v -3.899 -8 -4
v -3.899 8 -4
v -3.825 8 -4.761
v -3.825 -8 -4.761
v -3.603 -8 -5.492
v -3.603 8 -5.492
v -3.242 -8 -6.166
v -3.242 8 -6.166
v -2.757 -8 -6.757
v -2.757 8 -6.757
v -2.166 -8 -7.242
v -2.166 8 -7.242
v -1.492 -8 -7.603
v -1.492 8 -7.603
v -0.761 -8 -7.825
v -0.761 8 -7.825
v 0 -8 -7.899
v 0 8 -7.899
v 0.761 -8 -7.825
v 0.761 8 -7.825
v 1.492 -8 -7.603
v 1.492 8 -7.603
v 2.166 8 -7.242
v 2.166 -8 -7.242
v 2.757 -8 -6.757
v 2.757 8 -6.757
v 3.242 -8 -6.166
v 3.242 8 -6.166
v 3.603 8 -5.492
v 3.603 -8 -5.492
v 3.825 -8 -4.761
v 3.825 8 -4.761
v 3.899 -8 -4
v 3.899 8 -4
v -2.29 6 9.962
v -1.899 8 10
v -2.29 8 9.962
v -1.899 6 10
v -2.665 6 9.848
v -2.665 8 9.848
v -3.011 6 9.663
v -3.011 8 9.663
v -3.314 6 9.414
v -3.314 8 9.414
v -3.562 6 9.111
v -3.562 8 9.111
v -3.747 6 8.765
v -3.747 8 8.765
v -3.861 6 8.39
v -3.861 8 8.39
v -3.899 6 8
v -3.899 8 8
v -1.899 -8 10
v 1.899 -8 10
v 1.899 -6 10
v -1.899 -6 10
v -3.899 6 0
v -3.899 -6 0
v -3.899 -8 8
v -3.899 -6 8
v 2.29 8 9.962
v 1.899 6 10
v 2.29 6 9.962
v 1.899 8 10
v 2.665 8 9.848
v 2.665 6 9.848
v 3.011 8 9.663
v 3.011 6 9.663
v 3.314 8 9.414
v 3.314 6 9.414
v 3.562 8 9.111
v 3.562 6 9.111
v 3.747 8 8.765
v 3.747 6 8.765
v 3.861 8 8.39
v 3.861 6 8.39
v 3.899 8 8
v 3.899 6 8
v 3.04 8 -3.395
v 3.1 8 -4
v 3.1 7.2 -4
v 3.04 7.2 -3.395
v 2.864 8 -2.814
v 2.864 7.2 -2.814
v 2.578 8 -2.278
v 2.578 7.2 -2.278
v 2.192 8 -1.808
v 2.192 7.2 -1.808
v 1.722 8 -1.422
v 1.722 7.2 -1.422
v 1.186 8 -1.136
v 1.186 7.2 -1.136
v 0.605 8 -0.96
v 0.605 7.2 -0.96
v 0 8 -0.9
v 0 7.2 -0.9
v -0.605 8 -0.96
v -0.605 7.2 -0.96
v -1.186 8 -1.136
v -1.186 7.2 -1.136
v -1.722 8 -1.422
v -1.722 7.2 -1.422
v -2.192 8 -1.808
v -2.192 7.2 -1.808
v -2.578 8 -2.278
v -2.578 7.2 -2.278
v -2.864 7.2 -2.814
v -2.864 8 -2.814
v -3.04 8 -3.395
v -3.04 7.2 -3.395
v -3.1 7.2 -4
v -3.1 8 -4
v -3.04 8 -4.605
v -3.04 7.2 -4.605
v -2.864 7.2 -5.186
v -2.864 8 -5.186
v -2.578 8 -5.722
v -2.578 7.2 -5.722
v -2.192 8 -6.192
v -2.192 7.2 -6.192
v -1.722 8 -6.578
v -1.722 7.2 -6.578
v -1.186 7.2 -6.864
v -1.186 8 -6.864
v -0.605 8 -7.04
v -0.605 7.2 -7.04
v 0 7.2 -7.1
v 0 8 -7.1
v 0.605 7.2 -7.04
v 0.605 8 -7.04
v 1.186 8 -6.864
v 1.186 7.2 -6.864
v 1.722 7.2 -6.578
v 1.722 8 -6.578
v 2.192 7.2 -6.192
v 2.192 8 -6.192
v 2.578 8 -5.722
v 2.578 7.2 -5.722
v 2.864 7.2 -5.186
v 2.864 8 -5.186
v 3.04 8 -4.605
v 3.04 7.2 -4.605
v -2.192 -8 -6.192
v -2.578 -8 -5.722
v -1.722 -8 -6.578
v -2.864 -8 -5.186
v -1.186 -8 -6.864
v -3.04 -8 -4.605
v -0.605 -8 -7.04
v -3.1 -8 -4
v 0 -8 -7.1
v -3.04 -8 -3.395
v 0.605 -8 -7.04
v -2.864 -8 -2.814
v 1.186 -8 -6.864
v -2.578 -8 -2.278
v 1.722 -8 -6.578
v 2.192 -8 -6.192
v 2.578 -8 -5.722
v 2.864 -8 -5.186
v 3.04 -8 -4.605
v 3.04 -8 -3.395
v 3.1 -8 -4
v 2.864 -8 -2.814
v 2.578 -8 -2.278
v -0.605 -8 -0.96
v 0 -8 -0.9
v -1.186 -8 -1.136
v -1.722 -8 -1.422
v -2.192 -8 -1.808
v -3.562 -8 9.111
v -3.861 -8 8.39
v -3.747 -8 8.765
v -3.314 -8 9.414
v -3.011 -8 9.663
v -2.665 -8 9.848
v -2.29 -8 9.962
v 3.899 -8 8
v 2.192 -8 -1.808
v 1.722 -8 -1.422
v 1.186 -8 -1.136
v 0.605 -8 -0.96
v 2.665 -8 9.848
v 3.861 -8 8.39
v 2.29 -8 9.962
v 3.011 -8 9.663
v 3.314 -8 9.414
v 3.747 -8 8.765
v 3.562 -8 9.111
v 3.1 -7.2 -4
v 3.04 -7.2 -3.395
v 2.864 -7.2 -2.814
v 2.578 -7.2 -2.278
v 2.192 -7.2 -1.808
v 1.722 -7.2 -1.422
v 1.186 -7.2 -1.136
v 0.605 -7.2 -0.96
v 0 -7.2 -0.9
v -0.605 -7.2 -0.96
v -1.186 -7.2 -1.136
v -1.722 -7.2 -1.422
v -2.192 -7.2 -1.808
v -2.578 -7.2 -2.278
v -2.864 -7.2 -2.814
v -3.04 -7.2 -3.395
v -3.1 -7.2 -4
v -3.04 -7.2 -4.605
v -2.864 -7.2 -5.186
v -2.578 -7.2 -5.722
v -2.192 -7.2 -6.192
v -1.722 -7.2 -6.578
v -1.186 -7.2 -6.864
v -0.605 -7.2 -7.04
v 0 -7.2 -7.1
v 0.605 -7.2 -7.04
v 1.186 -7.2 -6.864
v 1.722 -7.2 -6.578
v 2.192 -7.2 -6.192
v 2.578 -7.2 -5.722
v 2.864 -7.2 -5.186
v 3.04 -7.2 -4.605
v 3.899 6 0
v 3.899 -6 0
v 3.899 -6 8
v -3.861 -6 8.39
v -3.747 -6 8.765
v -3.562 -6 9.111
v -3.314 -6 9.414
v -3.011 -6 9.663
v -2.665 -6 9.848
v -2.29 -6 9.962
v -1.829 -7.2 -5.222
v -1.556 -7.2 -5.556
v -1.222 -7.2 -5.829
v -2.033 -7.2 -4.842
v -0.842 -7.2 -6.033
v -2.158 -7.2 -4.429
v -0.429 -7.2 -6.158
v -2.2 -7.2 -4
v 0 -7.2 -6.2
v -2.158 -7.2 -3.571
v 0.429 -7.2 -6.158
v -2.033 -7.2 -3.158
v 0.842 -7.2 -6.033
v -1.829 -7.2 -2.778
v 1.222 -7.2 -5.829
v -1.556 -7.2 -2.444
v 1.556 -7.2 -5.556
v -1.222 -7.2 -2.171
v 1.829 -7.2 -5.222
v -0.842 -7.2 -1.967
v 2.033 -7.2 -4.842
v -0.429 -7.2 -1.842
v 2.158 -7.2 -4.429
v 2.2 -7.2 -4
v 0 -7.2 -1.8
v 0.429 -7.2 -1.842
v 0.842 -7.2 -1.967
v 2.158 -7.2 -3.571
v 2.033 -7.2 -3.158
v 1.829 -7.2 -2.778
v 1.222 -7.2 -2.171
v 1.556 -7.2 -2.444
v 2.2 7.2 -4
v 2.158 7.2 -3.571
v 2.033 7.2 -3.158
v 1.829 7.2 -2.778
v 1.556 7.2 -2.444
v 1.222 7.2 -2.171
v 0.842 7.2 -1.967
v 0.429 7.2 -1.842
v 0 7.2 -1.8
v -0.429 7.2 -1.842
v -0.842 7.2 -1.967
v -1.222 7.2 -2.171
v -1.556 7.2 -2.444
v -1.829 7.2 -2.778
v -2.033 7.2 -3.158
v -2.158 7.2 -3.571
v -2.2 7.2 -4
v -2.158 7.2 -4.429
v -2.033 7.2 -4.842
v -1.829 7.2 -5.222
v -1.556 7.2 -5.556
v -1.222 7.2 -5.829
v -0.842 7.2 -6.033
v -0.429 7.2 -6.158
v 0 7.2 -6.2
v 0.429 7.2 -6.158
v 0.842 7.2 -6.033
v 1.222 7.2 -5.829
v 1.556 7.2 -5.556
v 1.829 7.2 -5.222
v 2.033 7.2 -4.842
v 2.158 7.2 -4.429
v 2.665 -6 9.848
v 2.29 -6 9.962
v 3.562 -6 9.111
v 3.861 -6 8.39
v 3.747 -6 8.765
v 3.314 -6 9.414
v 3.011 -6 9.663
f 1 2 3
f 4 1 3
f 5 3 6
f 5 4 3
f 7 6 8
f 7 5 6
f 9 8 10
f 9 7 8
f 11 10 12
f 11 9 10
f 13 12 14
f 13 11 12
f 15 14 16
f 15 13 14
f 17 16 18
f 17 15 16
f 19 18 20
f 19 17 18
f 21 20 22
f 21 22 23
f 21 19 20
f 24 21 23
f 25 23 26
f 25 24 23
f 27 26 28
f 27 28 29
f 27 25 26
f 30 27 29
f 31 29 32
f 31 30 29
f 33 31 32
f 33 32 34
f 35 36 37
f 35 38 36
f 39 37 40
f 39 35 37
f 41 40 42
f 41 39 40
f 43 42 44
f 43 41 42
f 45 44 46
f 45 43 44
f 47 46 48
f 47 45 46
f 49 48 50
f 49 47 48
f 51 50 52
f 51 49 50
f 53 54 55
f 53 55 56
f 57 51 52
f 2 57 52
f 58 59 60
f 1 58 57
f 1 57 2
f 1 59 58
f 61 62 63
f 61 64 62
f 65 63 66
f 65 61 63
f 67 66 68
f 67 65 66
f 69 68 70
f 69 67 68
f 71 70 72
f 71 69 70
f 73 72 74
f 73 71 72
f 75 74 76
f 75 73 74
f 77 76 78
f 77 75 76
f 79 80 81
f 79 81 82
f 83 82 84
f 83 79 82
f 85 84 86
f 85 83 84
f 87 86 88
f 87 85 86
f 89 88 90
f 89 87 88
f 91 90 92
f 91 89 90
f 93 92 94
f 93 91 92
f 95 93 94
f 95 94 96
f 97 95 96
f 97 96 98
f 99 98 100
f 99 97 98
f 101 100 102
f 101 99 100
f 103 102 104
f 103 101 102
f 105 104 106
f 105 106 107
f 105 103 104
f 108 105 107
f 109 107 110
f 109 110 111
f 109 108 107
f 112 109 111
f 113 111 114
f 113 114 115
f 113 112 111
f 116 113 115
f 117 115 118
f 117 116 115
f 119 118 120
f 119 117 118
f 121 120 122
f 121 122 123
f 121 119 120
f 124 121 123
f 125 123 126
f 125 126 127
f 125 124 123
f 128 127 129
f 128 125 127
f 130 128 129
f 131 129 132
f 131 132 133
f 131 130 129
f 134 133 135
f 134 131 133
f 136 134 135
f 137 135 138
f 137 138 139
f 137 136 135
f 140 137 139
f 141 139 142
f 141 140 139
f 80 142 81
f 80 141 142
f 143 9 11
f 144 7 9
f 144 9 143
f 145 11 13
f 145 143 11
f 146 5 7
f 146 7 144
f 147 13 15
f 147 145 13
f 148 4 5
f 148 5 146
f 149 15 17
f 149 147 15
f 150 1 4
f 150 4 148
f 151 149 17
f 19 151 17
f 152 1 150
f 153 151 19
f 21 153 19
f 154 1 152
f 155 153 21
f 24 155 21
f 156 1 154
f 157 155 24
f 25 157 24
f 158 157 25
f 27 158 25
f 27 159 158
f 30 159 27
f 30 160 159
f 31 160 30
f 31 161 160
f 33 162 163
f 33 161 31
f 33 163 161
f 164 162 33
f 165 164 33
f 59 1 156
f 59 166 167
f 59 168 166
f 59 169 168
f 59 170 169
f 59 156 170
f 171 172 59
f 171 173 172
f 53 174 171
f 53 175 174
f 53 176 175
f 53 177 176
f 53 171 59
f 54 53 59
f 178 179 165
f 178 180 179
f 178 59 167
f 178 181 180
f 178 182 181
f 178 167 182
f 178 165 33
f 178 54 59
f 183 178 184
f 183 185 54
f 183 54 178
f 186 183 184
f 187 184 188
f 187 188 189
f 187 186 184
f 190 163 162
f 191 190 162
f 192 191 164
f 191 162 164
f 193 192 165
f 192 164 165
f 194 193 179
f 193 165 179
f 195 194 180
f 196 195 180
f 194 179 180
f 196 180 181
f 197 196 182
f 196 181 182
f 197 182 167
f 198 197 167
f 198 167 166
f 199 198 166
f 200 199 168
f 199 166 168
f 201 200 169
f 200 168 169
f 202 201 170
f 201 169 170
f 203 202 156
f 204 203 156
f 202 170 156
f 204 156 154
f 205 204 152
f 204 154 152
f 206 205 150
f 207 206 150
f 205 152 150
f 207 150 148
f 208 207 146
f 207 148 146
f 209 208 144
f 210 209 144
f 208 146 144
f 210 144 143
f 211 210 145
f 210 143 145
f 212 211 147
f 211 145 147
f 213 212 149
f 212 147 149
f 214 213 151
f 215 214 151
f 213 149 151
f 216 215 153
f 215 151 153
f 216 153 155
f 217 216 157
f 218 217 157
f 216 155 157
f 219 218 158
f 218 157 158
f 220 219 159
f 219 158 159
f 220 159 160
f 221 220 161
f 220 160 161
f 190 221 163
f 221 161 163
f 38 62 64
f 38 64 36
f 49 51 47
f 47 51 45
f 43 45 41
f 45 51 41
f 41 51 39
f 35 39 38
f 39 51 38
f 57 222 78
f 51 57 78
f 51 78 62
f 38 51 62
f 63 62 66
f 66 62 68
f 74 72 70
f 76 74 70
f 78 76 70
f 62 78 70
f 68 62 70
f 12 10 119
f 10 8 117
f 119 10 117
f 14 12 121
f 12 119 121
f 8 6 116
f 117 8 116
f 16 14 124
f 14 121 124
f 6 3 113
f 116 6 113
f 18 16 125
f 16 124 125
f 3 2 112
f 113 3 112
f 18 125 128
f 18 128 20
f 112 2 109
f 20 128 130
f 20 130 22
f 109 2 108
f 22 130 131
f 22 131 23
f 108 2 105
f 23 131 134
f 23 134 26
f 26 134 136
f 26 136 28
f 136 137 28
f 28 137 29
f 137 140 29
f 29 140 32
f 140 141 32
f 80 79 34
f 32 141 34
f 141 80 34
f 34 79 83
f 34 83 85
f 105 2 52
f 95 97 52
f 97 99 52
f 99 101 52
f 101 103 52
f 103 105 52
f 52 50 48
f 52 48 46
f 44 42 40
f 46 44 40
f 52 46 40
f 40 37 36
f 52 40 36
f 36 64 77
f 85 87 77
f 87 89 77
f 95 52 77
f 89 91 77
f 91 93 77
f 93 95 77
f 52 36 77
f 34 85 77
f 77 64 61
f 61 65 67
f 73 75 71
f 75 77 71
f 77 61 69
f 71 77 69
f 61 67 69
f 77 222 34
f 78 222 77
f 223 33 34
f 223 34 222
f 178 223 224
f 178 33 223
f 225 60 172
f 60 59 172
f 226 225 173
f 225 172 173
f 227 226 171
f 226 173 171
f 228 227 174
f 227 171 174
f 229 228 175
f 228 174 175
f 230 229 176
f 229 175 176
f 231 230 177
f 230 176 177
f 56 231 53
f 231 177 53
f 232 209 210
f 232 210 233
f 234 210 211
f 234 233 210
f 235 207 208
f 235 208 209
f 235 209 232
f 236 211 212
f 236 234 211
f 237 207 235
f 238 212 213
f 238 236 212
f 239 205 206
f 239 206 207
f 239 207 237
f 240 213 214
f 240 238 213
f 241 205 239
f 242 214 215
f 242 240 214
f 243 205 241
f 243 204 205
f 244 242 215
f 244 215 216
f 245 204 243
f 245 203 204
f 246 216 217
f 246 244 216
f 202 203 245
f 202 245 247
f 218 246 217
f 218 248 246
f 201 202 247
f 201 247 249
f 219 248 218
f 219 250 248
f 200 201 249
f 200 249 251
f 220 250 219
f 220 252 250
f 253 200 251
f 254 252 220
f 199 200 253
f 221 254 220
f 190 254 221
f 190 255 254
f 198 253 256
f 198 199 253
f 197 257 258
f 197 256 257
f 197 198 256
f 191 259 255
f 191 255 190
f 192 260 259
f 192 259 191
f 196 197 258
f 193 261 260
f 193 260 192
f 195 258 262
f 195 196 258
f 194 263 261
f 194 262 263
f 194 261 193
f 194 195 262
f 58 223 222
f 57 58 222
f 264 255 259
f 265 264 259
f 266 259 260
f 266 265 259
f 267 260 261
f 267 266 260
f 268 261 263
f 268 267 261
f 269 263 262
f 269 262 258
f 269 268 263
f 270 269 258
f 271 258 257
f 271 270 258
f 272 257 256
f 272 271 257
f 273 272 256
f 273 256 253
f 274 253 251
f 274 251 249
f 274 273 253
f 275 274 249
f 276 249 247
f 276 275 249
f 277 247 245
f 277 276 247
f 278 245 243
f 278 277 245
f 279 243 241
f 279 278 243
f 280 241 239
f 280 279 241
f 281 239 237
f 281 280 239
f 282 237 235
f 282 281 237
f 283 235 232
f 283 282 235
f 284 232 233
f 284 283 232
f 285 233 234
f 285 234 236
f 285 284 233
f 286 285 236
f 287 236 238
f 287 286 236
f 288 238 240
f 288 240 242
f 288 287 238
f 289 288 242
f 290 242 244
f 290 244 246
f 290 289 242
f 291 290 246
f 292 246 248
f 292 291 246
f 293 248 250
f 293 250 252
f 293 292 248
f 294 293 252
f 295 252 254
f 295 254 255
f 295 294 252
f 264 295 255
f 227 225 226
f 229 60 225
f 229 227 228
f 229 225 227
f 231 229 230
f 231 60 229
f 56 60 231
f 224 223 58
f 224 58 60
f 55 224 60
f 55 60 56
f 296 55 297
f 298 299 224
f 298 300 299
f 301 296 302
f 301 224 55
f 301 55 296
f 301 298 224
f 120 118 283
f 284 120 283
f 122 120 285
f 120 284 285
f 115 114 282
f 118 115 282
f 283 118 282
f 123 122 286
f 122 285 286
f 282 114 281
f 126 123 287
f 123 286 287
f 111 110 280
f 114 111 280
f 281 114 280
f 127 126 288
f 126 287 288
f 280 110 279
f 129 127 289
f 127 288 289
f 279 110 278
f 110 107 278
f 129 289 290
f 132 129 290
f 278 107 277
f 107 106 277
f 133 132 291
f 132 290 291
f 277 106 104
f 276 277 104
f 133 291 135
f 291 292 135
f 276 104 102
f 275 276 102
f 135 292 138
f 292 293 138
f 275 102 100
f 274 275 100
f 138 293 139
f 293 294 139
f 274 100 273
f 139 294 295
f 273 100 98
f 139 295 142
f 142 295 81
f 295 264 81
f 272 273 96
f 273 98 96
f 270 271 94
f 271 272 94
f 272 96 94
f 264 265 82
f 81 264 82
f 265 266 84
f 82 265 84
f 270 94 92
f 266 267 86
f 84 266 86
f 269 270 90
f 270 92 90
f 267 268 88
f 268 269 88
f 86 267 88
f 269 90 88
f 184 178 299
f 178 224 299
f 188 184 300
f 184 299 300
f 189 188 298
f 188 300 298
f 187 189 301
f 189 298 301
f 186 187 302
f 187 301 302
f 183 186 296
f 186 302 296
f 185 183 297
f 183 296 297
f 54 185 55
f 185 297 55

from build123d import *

# Parameters (mm, degrees)
F2_R     = 3.1
F2_R_2   = 2.2
F4_DEPTH = 8
F3_W     = 12
F3_H     = 10
F5_DEPTH = 12.5
F6_R     = 2
F7_DEPTH = 0.8


# Not quite as in the source:
# - the program builds the solid bodies; features that only make, move or delete a surface that nothing else refers to are left out


with BuildPart() as f4:
    # F2 (on Front) → F4 (new body, symmetric)
    with BuildSketch(Plane.XZ):
        with BuildLine():
            Line((3.8994949366, 10), (-3.8994949366, 10))
            Line((-3.8994949366, 10), (-3.8994949366, -4))
            ThreePointArc((-3.8994949366, -4), (0, -7.8994949366), (3.8994949366, -4))
            Line((3.8994949366, -4), (3.8994949366, 10))
        make_face()
        with Locations((0, -4)):
            Circle(F2_R, mode=Mode.SUBTRACT)
        with Locations((0, -4)):
            Circle(F2_R)
        with Locations((0, -4)):
            Circle(F2_R_2, mode=Mode.SUBTRACT)
    extrude(amount=F4_DEPTH, both=True)

    # F3 (on Right) → F5 (cut, symmetric)
    with BuildSketch(Plane.YZ):
        with Locations((0, 5)):
            Rectangle(F3_W, F3_H)
    extrude(amount=F5_DEPTH, both=True, mode=Mode.SUBTRACT)

    # F6
    f6_edges = [f4.edges().sort_by_distance(p)[0] for p in [
        (-3.899495, -7, 10),
        (3.899495, -7, 10),
        (3.899495, 7, 10),
        (-3.899495, 7, 10),
    ]]
    fillet(f6_edges, radius=F6_R)


with BuildPart() as f7:
    # F2 (on Front) → F7 (new body)
    with BuildSketch(Plane.XZ):
        with Locations((0, -4)):
            Circle(F2_R)
        with Locations((0, -4)):
            Circle(F2_R_2, mode=Mode.SUBTRACT)
    extrude(amount=F7_DEPTH)


with BuildPart() as f7_1:
    # F8: moved
    add(f7.part.moved(Location((0, 8, 0))))


with BuildPart() as f9_1:
    # F9: instance of F7
    add(f7_1.part.mirror(Plane.XZ))


with BuildPart() as f4_1:
    add(f4.part)

    # F10: cut F7, F9_1
    add(f7_1.part, mode=Mode.SUBTRACT)
    add(f9_1.part, mode=Mode.SUBTRACT)


solid = f4_1.part
